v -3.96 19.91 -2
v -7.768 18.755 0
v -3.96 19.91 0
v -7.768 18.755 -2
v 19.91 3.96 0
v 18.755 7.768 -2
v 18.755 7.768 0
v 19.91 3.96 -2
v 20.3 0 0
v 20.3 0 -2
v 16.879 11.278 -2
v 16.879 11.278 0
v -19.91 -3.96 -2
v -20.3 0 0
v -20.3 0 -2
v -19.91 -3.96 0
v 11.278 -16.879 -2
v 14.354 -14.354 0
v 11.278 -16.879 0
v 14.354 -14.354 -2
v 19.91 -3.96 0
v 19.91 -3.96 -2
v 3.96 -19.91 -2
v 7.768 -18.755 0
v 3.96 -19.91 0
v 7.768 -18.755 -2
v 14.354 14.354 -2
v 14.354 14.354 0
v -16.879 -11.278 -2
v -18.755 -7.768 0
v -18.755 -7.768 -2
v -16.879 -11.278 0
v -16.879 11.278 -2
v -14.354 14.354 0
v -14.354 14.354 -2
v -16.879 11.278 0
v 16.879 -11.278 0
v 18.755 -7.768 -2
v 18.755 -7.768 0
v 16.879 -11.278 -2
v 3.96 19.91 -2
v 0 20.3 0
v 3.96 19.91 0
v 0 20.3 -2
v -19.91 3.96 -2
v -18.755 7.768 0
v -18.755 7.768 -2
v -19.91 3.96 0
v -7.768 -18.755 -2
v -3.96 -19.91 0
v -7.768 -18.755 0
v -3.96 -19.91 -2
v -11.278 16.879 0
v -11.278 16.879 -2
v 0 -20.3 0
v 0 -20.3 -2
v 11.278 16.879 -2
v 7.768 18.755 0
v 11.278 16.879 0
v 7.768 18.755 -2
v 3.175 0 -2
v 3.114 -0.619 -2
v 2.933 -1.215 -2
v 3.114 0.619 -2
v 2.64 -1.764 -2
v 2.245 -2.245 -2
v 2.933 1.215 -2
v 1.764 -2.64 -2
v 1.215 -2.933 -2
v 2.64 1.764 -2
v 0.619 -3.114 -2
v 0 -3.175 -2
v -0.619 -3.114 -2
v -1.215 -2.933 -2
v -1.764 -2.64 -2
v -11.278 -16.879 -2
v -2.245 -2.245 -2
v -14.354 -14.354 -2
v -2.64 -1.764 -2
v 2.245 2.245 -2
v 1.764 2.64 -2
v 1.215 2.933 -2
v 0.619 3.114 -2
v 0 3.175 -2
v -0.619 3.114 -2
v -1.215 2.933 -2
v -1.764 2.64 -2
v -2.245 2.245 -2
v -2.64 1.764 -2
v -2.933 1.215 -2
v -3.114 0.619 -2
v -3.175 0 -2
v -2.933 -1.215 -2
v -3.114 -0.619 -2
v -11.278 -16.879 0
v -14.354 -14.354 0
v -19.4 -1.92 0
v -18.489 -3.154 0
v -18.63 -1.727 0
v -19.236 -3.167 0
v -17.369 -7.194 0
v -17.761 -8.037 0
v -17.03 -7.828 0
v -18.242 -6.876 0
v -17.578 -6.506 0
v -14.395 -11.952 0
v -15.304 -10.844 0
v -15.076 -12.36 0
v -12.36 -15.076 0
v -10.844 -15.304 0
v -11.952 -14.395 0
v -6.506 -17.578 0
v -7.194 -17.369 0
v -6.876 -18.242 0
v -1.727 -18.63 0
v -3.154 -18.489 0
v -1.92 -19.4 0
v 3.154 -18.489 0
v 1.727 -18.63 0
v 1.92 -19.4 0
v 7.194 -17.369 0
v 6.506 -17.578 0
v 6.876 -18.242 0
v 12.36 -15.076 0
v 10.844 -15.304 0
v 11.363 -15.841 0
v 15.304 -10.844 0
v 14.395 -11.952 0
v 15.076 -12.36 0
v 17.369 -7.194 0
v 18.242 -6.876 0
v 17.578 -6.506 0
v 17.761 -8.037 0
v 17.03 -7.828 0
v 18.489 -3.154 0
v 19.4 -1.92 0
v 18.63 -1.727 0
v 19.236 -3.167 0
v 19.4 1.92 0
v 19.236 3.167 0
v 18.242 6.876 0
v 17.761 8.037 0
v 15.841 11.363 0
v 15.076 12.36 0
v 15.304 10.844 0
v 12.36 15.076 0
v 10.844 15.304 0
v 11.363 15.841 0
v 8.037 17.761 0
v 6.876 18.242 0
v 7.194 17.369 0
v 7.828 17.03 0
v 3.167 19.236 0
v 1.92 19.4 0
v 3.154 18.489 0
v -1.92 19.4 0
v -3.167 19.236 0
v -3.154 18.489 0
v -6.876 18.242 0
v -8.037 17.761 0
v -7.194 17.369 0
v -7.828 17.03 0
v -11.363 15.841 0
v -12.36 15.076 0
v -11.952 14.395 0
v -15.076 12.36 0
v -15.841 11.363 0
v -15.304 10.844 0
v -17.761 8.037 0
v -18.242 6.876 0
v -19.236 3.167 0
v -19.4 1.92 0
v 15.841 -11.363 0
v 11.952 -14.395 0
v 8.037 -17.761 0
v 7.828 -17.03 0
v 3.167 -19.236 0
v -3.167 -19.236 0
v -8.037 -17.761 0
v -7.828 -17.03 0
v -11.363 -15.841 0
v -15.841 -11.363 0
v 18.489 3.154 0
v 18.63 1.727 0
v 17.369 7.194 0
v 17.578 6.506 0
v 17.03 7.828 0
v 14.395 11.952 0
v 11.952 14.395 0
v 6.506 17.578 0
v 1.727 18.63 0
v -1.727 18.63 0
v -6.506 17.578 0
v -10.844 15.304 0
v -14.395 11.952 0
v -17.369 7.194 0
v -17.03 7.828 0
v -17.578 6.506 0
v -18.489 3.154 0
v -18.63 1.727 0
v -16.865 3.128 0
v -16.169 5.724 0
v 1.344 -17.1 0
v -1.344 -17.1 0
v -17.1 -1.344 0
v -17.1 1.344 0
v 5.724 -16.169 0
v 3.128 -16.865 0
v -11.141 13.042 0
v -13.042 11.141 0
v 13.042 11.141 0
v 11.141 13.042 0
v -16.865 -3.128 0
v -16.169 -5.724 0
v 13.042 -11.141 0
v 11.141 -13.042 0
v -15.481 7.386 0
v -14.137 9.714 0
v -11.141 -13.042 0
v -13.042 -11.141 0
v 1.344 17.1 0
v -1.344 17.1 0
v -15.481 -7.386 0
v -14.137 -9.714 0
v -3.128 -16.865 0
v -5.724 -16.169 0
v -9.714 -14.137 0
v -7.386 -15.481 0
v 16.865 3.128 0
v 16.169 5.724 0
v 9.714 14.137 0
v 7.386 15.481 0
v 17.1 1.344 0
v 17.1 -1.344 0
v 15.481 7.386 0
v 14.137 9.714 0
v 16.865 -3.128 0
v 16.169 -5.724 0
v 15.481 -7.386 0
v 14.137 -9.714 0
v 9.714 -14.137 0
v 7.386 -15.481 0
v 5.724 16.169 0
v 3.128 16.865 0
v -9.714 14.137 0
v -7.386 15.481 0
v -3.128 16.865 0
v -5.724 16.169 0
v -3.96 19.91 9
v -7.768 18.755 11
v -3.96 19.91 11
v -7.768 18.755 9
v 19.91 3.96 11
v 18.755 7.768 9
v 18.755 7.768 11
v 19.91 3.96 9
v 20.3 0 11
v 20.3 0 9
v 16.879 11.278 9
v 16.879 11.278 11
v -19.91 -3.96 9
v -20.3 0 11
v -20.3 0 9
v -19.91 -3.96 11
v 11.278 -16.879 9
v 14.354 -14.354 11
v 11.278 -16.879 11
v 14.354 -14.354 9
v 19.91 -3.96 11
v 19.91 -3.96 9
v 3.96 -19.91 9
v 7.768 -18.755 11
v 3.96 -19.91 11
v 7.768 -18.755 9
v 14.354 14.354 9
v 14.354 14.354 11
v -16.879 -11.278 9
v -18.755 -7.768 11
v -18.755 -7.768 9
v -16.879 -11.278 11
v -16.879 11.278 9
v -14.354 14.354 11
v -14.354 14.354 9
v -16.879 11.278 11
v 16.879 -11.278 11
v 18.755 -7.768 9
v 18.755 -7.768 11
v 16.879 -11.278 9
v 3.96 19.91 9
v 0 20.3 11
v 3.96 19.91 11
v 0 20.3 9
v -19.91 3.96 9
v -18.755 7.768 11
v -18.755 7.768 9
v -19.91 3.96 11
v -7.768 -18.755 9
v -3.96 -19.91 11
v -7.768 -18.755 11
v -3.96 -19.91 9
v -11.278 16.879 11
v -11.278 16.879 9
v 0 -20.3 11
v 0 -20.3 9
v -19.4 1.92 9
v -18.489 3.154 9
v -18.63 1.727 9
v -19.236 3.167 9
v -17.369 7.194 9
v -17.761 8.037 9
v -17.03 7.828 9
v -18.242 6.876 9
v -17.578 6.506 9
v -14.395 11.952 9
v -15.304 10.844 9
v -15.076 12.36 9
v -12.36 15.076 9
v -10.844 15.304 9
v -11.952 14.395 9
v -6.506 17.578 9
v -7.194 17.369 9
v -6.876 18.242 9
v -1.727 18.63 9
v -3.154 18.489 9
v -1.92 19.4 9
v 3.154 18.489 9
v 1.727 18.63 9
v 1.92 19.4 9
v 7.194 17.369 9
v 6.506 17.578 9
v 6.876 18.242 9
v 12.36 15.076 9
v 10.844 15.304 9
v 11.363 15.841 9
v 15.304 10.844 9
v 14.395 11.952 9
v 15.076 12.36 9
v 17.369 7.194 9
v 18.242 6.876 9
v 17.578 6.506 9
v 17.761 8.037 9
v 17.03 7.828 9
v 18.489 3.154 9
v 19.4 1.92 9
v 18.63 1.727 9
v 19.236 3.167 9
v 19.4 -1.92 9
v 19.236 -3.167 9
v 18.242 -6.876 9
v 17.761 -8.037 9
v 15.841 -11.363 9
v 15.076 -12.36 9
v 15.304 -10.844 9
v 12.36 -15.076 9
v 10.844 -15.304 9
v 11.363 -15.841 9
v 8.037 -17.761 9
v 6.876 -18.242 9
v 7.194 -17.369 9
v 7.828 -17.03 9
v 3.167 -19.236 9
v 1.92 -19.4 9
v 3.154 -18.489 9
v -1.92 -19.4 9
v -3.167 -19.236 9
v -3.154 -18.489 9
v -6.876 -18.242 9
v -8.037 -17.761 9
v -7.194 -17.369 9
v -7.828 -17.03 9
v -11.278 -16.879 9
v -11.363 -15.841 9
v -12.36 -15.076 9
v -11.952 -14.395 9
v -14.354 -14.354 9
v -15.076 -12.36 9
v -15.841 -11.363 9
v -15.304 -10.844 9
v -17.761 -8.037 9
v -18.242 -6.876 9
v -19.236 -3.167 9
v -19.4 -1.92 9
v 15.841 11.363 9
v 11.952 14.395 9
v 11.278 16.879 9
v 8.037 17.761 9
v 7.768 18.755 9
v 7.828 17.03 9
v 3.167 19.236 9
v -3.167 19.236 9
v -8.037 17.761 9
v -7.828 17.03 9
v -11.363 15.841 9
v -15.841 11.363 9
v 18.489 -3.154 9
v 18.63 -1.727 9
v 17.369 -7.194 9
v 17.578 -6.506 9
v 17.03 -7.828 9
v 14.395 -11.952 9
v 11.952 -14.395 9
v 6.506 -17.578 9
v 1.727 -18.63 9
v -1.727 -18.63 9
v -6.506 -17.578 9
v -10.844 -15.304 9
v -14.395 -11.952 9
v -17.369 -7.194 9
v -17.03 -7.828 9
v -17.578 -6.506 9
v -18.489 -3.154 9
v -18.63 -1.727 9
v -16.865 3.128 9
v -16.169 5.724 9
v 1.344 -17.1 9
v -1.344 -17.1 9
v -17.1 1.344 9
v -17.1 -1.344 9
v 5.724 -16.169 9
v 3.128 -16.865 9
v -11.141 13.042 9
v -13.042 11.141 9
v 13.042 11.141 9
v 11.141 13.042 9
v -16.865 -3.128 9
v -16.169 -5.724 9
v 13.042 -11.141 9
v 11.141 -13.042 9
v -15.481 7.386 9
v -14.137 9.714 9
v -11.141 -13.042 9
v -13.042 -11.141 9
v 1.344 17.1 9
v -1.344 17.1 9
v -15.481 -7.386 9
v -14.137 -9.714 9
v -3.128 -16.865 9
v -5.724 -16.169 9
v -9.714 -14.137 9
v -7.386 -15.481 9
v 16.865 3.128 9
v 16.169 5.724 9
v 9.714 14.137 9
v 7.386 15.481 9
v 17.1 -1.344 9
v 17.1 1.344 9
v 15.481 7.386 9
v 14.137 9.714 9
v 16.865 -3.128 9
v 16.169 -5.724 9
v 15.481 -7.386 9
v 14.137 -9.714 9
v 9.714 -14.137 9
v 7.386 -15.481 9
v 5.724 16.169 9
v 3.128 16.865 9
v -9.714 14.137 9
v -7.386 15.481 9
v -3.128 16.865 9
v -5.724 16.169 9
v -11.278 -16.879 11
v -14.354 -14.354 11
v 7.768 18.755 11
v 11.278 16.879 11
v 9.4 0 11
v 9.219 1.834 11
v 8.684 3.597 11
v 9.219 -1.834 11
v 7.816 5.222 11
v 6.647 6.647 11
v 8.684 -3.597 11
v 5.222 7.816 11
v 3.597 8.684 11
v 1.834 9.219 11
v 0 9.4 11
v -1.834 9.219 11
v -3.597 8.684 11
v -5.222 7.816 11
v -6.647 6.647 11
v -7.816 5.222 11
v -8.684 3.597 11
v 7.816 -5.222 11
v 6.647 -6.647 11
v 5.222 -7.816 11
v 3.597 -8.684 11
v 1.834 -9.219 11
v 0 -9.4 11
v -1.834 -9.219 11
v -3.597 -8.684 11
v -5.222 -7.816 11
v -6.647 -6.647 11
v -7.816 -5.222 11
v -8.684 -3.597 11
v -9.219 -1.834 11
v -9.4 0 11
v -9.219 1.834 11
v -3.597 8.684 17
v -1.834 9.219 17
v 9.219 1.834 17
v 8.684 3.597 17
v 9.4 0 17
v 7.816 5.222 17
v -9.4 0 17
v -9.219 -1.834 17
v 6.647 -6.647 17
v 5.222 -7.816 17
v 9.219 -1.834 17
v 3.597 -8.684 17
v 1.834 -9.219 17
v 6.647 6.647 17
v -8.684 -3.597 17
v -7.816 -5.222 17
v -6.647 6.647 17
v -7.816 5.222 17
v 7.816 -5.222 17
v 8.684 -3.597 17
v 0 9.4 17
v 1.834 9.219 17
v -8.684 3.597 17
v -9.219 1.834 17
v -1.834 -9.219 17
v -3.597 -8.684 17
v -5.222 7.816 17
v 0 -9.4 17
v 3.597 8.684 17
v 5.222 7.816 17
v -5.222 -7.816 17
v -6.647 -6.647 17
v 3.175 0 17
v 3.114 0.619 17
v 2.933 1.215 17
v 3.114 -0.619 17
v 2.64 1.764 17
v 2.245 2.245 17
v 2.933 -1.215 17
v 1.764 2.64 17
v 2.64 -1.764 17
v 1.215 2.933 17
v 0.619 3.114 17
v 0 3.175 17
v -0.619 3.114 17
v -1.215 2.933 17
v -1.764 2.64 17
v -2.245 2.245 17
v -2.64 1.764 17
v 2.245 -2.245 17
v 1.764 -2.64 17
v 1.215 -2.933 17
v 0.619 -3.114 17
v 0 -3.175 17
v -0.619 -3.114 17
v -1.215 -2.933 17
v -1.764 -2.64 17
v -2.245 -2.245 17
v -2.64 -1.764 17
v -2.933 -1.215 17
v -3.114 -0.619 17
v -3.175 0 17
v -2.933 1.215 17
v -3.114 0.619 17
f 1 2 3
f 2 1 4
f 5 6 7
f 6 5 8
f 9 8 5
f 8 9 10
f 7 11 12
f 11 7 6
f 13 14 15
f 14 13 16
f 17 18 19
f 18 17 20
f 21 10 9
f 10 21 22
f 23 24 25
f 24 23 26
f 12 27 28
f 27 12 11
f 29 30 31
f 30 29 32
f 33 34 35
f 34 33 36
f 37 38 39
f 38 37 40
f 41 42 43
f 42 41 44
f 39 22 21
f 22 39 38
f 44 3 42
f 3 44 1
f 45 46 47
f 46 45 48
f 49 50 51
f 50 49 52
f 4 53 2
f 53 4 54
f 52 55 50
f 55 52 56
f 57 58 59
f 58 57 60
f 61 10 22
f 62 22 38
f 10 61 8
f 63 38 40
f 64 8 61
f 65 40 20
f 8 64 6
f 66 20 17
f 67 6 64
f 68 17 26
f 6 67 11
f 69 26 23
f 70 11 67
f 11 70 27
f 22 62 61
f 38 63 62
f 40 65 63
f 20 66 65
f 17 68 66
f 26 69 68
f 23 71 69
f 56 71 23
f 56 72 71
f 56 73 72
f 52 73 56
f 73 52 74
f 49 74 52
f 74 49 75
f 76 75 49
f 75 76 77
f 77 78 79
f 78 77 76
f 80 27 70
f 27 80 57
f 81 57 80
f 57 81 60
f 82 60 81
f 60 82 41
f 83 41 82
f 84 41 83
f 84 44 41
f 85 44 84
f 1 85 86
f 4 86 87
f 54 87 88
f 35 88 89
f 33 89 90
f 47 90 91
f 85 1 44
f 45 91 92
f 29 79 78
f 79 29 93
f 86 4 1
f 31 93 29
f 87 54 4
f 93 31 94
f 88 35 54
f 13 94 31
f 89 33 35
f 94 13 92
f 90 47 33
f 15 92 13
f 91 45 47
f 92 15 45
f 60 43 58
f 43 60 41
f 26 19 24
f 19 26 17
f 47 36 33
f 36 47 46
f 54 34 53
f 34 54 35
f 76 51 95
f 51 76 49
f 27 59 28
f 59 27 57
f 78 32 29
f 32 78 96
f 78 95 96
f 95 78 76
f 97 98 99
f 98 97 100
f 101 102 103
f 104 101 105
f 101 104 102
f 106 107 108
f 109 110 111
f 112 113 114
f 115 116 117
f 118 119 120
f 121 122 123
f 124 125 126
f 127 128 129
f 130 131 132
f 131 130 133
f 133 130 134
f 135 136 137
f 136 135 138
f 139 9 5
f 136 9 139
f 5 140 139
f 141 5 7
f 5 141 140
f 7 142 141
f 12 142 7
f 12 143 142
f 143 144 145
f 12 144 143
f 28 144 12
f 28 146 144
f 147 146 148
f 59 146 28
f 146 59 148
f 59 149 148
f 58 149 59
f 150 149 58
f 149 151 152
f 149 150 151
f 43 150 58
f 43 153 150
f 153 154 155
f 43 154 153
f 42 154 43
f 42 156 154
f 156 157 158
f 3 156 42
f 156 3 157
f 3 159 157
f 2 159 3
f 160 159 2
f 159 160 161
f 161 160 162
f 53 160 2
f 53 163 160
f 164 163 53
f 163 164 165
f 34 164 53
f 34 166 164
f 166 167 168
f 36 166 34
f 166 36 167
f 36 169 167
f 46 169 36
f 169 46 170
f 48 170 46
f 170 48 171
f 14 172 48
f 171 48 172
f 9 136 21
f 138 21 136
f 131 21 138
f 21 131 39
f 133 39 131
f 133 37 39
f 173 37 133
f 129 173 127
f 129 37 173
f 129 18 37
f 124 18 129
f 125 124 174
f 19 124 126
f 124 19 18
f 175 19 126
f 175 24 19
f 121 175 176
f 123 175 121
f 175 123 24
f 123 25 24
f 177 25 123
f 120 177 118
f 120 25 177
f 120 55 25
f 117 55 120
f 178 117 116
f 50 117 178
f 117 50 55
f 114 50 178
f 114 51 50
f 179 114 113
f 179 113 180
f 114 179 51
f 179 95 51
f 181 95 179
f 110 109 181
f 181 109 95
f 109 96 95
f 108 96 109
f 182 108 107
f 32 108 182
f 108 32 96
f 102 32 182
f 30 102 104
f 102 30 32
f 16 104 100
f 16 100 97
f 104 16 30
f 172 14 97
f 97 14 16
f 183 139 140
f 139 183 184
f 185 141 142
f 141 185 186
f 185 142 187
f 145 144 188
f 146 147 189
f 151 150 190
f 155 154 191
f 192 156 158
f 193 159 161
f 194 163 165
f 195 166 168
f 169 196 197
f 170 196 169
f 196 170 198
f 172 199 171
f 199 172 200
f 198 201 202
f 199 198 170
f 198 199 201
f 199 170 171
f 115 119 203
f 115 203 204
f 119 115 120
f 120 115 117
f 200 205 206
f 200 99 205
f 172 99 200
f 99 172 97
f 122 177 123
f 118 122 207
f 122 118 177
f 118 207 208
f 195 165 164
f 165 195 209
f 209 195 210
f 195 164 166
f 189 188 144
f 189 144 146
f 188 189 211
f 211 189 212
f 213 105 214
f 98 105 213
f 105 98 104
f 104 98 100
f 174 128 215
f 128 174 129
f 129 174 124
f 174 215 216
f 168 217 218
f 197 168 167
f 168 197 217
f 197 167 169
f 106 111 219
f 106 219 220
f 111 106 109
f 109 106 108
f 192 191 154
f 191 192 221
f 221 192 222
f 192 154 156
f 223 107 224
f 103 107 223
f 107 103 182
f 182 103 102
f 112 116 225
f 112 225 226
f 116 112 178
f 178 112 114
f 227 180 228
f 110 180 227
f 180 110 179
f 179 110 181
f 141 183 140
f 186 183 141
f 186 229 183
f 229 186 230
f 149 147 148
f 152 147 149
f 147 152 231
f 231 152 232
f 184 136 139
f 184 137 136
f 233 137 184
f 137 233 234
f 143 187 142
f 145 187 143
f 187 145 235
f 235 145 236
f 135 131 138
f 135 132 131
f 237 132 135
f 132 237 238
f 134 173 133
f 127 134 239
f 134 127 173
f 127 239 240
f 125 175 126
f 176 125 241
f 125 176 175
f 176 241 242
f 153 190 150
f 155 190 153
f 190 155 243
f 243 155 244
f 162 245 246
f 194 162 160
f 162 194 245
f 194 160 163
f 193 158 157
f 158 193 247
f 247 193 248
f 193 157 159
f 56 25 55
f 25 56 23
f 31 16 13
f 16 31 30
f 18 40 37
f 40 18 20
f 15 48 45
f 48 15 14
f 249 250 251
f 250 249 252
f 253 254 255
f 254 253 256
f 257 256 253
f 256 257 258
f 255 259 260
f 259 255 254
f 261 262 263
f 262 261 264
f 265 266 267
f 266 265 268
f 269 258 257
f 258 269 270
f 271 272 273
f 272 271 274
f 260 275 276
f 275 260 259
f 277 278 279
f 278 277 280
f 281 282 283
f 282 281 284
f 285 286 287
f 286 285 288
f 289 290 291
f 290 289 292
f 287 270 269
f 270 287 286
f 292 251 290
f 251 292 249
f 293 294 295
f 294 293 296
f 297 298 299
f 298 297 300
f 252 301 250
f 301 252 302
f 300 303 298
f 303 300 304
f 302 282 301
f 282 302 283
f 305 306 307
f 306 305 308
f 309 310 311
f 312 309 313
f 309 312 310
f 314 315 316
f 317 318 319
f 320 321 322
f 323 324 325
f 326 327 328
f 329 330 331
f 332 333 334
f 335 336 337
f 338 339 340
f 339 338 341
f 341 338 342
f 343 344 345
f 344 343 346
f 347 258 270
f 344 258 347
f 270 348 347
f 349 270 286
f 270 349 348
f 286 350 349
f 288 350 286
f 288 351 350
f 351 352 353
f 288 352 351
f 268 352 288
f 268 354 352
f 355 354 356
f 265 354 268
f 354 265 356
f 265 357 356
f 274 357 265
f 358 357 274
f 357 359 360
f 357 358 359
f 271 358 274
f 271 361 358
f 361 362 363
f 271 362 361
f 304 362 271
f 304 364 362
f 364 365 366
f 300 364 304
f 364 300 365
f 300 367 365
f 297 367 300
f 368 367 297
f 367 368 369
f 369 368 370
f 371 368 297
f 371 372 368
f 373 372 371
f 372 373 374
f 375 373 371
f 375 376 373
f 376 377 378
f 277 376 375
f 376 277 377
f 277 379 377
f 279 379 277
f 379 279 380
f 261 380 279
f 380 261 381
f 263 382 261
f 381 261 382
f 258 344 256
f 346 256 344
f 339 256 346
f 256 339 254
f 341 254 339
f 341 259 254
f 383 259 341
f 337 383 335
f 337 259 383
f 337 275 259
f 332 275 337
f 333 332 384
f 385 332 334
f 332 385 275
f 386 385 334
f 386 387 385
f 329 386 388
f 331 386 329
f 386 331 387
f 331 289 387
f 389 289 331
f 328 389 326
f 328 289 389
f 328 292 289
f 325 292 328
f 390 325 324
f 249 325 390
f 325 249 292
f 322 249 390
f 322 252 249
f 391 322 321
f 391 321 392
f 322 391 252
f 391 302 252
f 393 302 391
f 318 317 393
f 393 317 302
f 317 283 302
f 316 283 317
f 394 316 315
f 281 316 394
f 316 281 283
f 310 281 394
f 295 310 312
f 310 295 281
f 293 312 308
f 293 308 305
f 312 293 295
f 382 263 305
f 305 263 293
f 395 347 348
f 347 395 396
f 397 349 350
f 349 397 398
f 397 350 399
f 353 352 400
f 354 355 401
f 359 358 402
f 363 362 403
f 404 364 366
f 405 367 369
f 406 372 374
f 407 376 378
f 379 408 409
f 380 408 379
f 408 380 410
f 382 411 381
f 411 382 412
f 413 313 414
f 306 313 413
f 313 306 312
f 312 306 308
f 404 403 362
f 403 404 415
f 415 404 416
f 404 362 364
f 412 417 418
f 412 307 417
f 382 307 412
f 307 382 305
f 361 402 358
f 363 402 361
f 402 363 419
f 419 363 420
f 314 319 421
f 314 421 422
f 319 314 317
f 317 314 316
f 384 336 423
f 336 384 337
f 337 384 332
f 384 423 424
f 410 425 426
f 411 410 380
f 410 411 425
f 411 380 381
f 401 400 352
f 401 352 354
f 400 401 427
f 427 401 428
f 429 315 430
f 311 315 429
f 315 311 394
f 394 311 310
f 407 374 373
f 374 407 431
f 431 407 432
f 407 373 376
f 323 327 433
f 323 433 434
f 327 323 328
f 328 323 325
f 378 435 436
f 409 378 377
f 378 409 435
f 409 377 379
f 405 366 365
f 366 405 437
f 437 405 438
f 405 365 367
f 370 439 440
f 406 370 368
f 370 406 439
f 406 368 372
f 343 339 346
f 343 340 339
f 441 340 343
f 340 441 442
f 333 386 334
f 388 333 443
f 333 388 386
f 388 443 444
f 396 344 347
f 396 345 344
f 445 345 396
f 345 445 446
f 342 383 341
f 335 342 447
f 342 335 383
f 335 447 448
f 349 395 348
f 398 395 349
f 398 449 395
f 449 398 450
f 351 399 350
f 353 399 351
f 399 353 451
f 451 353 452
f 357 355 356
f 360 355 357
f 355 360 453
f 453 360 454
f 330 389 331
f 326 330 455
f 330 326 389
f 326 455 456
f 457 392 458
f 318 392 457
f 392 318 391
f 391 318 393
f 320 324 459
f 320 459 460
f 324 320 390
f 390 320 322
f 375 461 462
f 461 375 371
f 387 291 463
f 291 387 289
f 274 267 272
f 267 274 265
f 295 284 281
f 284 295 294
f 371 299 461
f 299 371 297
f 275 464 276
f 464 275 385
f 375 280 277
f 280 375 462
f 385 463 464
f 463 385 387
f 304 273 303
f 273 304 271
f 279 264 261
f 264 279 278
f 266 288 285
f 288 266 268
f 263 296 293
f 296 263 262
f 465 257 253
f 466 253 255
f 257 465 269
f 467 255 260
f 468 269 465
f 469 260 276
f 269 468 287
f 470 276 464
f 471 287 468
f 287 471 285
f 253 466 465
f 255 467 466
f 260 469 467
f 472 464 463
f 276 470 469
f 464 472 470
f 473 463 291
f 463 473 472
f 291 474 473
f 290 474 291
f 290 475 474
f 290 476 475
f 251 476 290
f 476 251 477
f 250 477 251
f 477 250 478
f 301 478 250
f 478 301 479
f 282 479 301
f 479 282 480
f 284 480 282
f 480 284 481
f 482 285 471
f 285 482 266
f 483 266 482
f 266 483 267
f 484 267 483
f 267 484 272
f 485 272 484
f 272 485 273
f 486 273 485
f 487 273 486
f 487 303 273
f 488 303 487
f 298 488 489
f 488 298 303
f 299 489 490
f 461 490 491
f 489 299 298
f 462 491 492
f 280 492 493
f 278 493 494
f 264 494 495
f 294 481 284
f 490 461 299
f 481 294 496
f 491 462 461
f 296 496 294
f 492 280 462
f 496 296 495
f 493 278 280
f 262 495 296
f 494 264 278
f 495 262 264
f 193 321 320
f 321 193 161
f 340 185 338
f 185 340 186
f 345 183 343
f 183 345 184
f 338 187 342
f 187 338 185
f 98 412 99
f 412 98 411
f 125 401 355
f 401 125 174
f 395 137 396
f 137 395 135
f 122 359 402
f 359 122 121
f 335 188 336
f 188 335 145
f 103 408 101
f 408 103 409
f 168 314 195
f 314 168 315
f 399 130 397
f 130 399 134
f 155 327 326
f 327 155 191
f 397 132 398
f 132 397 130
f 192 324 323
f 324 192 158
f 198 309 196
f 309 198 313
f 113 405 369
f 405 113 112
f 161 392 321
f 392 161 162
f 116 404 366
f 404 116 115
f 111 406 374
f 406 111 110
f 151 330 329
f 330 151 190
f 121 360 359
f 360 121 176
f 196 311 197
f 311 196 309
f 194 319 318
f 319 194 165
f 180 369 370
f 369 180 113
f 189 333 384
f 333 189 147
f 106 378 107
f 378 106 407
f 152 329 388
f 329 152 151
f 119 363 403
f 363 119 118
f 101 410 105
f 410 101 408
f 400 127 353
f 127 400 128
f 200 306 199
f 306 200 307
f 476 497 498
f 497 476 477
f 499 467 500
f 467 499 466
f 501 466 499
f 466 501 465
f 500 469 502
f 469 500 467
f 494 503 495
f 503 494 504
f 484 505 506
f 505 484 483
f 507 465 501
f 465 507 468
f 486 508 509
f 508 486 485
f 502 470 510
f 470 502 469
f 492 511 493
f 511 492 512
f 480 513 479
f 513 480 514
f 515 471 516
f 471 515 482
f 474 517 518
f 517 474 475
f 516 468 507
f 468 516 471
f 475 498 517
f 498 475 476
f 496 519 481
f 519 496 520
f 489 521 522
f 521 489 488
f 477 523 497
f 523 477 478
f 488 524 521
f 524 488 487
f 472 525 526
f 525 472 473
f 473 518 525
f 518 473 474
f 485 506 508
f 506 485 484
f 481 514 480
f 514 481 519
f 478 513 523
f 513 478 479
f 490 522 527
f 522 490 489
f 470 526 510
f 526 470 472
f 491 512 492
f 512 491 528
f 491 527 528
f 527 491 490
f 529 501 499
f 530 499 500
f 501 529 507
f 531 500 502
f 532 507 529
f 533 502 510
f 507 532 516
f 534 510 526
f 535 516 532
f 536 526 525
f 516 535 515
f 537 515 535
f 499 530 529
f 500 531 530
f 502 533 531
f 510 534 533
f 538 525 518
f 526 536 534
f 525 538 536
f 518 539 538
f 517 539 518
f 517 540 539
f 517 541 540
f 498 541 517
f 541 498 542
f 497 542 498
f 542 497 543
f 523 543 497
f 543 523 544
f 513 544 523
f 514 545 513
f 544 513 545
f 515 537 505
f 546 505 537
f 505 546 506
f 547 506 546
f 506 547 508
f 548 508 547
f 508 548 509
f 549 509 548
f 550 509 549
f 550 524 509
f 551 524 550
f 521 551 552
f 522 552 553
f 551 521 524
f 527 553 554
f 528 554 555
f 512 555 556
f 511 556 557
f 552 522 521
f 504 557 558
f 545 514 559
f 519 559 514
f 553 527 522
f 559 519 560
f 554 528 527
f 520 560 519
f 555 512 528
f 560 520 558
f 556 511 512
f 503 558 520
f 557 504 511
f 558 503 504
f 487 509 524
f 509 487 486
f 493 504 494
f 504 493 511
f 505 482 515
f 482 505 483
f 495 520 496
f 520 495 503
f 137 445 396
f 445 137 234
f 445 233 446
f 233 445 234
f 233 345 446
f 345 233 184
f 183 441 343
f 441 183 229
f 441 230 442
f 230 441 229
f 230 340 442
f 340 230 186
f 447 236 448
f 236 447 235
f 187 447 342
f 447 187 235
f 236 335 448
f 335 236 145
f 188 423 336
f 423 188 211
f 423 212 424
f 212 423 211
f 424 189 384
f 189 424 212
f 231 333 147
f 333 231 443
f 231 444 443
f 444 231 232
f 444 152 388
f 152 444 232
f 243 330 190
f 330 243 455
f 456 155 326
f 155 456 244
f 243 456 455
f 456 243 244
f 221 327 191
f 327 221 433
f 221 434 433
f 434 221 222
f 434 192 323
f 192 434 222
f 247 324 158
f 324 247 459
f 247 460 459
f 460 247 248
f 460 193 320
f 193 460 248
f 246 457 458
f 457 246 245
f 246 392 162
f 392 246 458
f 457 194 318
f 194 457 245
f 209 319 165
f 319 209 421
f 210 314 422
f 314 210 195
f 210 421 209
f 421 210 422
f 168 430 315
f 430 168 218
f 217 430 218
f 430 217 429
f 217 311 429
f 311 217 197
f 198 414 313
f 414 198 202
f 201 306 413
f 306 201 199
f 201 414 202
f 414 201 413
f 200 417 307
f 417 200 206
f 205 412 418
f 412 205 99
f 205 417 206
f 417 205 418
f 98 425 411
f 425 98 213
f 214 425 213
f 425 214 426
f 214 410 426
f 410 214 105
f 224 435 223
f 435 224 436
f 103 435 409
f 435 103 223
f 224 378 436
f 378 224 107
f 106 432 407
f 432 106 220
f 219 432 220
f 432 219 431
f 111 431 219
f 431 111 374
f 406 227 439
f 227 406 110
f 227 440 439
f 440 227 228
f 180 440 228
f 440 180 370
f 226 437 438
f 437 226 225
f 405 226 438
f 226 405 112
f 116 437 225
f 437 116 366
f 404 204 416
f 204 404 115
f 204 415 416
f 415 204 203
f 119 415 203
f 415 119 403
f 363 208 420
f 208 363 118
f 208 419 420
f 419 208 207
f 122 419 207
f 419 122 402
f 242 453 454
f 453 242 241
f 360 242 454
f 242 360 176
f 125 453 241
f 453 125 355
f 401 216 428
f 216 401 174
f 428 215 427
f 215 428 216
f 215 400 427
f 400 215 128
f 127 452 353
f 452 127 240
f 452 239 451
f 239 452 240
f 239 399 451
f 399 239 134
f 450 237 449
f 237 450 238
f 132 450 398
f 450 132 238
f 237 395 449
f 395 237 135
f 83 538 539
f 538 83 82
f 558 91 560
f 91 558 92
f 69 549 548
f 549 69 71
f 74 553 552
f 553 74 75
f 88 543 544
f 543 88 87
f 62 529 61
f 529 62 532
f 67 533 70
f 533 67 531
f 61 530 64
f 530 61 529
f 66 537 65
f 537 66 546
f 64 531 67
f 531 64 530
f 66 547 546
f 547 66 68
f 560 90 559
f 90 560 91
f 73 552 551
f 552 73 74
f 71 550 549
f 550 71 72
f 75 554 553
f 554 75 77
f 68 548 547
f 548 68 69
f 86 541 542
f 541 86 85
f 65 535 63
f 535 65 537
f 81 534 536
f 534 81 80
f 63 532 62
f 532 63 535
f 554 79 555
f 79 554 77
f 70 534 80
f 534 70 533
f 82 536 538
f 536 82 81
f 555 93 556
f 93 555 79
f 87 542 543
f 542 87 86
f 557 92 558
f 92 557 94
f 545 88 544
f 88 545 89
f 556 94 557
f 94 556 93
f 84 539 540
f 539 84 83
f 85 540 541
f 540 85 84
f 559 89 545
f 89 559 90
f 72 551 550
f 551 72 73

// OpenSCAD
$fn = 32;

// ----------------------------------------------------------------------
// Timing pulley: HTD5 24T, pitch 5 mm, 40.6 mm x 19 mm
// ----------------------------------------------------------------------

// --- parameters (mm) ---
pitch = 5;                // belt pitch
teeth = 24;               // number of grooves
belt_w = 9;               // belt width between the flanges
tip_d = 37.6;             // tip circle diameter
root_d = 35.4;            // groove bottom diameter
groove_h = 1.1;           // groove depth
tooth_w = 3.2;            // groove width at the tip circle
flange_d = 40.6;          // flange diameter
flange_t = 2;             // flange thickness
spigot_d = 33.8;          // flange spigot, sunk into the rim
spigot_h = 1.2;           // spigot depth into the rim
bore_d = 6.35;            // shaft bore
hub_d = 18.8;             // hub diameter
hub_h = 6;                // hub above the flange
bottom_z = -2;            // lowest point of the pulley
top_z = 17;               // highest point of the pulley

module rim() {
  cylinder(h = belt_w, d = tip_d);
}

module groove_cutter() {
  /* belt tooth groove: deeper than wide, cut through the belt width */
  translate([root_d / 2, 0, 0])
    linear_extrude(height = belt_w)
      polygon(points = [[-0.6, -tooth_w * 0.42], [groove_h + 0.6, -tooth_w * 0.6],
                        [groove_h + 0.6, tooth_w * 0.6], [-0.6, tooth_w * 0.42]]);
}

module flanges() {
  translate([0, 0, -flange_t]) cylinder(h = flange_t, d = flange_d);
  translate([0, 0, belt_w]) cylinder(h = flange_t, d = flange_d);
  translate([0, 0, -spigot_h]) cylinder(h = spigot_h + 0.6, d = spigot_d);
  translate([0, 0, belt_w - 0.6]) cylinder(h = spigot_h + 0.6, d = spigot_d);
}

module hub() {
  translate([0, 0, bottom_z]) cylinder(h = top_z - bottom_z, d = hub_d);
}

difference() {
  union() {
    rim();
    hub();
    flanges();
  }
  for (i = [0 : teeth - 1]) rotate([0, 0, i * 360 / teeth]) groove_cutter();
  translate([0, 0, bottom_z - 1]) cylinder(h = top_z - bottom_z + 2, d = bore_d);
}
